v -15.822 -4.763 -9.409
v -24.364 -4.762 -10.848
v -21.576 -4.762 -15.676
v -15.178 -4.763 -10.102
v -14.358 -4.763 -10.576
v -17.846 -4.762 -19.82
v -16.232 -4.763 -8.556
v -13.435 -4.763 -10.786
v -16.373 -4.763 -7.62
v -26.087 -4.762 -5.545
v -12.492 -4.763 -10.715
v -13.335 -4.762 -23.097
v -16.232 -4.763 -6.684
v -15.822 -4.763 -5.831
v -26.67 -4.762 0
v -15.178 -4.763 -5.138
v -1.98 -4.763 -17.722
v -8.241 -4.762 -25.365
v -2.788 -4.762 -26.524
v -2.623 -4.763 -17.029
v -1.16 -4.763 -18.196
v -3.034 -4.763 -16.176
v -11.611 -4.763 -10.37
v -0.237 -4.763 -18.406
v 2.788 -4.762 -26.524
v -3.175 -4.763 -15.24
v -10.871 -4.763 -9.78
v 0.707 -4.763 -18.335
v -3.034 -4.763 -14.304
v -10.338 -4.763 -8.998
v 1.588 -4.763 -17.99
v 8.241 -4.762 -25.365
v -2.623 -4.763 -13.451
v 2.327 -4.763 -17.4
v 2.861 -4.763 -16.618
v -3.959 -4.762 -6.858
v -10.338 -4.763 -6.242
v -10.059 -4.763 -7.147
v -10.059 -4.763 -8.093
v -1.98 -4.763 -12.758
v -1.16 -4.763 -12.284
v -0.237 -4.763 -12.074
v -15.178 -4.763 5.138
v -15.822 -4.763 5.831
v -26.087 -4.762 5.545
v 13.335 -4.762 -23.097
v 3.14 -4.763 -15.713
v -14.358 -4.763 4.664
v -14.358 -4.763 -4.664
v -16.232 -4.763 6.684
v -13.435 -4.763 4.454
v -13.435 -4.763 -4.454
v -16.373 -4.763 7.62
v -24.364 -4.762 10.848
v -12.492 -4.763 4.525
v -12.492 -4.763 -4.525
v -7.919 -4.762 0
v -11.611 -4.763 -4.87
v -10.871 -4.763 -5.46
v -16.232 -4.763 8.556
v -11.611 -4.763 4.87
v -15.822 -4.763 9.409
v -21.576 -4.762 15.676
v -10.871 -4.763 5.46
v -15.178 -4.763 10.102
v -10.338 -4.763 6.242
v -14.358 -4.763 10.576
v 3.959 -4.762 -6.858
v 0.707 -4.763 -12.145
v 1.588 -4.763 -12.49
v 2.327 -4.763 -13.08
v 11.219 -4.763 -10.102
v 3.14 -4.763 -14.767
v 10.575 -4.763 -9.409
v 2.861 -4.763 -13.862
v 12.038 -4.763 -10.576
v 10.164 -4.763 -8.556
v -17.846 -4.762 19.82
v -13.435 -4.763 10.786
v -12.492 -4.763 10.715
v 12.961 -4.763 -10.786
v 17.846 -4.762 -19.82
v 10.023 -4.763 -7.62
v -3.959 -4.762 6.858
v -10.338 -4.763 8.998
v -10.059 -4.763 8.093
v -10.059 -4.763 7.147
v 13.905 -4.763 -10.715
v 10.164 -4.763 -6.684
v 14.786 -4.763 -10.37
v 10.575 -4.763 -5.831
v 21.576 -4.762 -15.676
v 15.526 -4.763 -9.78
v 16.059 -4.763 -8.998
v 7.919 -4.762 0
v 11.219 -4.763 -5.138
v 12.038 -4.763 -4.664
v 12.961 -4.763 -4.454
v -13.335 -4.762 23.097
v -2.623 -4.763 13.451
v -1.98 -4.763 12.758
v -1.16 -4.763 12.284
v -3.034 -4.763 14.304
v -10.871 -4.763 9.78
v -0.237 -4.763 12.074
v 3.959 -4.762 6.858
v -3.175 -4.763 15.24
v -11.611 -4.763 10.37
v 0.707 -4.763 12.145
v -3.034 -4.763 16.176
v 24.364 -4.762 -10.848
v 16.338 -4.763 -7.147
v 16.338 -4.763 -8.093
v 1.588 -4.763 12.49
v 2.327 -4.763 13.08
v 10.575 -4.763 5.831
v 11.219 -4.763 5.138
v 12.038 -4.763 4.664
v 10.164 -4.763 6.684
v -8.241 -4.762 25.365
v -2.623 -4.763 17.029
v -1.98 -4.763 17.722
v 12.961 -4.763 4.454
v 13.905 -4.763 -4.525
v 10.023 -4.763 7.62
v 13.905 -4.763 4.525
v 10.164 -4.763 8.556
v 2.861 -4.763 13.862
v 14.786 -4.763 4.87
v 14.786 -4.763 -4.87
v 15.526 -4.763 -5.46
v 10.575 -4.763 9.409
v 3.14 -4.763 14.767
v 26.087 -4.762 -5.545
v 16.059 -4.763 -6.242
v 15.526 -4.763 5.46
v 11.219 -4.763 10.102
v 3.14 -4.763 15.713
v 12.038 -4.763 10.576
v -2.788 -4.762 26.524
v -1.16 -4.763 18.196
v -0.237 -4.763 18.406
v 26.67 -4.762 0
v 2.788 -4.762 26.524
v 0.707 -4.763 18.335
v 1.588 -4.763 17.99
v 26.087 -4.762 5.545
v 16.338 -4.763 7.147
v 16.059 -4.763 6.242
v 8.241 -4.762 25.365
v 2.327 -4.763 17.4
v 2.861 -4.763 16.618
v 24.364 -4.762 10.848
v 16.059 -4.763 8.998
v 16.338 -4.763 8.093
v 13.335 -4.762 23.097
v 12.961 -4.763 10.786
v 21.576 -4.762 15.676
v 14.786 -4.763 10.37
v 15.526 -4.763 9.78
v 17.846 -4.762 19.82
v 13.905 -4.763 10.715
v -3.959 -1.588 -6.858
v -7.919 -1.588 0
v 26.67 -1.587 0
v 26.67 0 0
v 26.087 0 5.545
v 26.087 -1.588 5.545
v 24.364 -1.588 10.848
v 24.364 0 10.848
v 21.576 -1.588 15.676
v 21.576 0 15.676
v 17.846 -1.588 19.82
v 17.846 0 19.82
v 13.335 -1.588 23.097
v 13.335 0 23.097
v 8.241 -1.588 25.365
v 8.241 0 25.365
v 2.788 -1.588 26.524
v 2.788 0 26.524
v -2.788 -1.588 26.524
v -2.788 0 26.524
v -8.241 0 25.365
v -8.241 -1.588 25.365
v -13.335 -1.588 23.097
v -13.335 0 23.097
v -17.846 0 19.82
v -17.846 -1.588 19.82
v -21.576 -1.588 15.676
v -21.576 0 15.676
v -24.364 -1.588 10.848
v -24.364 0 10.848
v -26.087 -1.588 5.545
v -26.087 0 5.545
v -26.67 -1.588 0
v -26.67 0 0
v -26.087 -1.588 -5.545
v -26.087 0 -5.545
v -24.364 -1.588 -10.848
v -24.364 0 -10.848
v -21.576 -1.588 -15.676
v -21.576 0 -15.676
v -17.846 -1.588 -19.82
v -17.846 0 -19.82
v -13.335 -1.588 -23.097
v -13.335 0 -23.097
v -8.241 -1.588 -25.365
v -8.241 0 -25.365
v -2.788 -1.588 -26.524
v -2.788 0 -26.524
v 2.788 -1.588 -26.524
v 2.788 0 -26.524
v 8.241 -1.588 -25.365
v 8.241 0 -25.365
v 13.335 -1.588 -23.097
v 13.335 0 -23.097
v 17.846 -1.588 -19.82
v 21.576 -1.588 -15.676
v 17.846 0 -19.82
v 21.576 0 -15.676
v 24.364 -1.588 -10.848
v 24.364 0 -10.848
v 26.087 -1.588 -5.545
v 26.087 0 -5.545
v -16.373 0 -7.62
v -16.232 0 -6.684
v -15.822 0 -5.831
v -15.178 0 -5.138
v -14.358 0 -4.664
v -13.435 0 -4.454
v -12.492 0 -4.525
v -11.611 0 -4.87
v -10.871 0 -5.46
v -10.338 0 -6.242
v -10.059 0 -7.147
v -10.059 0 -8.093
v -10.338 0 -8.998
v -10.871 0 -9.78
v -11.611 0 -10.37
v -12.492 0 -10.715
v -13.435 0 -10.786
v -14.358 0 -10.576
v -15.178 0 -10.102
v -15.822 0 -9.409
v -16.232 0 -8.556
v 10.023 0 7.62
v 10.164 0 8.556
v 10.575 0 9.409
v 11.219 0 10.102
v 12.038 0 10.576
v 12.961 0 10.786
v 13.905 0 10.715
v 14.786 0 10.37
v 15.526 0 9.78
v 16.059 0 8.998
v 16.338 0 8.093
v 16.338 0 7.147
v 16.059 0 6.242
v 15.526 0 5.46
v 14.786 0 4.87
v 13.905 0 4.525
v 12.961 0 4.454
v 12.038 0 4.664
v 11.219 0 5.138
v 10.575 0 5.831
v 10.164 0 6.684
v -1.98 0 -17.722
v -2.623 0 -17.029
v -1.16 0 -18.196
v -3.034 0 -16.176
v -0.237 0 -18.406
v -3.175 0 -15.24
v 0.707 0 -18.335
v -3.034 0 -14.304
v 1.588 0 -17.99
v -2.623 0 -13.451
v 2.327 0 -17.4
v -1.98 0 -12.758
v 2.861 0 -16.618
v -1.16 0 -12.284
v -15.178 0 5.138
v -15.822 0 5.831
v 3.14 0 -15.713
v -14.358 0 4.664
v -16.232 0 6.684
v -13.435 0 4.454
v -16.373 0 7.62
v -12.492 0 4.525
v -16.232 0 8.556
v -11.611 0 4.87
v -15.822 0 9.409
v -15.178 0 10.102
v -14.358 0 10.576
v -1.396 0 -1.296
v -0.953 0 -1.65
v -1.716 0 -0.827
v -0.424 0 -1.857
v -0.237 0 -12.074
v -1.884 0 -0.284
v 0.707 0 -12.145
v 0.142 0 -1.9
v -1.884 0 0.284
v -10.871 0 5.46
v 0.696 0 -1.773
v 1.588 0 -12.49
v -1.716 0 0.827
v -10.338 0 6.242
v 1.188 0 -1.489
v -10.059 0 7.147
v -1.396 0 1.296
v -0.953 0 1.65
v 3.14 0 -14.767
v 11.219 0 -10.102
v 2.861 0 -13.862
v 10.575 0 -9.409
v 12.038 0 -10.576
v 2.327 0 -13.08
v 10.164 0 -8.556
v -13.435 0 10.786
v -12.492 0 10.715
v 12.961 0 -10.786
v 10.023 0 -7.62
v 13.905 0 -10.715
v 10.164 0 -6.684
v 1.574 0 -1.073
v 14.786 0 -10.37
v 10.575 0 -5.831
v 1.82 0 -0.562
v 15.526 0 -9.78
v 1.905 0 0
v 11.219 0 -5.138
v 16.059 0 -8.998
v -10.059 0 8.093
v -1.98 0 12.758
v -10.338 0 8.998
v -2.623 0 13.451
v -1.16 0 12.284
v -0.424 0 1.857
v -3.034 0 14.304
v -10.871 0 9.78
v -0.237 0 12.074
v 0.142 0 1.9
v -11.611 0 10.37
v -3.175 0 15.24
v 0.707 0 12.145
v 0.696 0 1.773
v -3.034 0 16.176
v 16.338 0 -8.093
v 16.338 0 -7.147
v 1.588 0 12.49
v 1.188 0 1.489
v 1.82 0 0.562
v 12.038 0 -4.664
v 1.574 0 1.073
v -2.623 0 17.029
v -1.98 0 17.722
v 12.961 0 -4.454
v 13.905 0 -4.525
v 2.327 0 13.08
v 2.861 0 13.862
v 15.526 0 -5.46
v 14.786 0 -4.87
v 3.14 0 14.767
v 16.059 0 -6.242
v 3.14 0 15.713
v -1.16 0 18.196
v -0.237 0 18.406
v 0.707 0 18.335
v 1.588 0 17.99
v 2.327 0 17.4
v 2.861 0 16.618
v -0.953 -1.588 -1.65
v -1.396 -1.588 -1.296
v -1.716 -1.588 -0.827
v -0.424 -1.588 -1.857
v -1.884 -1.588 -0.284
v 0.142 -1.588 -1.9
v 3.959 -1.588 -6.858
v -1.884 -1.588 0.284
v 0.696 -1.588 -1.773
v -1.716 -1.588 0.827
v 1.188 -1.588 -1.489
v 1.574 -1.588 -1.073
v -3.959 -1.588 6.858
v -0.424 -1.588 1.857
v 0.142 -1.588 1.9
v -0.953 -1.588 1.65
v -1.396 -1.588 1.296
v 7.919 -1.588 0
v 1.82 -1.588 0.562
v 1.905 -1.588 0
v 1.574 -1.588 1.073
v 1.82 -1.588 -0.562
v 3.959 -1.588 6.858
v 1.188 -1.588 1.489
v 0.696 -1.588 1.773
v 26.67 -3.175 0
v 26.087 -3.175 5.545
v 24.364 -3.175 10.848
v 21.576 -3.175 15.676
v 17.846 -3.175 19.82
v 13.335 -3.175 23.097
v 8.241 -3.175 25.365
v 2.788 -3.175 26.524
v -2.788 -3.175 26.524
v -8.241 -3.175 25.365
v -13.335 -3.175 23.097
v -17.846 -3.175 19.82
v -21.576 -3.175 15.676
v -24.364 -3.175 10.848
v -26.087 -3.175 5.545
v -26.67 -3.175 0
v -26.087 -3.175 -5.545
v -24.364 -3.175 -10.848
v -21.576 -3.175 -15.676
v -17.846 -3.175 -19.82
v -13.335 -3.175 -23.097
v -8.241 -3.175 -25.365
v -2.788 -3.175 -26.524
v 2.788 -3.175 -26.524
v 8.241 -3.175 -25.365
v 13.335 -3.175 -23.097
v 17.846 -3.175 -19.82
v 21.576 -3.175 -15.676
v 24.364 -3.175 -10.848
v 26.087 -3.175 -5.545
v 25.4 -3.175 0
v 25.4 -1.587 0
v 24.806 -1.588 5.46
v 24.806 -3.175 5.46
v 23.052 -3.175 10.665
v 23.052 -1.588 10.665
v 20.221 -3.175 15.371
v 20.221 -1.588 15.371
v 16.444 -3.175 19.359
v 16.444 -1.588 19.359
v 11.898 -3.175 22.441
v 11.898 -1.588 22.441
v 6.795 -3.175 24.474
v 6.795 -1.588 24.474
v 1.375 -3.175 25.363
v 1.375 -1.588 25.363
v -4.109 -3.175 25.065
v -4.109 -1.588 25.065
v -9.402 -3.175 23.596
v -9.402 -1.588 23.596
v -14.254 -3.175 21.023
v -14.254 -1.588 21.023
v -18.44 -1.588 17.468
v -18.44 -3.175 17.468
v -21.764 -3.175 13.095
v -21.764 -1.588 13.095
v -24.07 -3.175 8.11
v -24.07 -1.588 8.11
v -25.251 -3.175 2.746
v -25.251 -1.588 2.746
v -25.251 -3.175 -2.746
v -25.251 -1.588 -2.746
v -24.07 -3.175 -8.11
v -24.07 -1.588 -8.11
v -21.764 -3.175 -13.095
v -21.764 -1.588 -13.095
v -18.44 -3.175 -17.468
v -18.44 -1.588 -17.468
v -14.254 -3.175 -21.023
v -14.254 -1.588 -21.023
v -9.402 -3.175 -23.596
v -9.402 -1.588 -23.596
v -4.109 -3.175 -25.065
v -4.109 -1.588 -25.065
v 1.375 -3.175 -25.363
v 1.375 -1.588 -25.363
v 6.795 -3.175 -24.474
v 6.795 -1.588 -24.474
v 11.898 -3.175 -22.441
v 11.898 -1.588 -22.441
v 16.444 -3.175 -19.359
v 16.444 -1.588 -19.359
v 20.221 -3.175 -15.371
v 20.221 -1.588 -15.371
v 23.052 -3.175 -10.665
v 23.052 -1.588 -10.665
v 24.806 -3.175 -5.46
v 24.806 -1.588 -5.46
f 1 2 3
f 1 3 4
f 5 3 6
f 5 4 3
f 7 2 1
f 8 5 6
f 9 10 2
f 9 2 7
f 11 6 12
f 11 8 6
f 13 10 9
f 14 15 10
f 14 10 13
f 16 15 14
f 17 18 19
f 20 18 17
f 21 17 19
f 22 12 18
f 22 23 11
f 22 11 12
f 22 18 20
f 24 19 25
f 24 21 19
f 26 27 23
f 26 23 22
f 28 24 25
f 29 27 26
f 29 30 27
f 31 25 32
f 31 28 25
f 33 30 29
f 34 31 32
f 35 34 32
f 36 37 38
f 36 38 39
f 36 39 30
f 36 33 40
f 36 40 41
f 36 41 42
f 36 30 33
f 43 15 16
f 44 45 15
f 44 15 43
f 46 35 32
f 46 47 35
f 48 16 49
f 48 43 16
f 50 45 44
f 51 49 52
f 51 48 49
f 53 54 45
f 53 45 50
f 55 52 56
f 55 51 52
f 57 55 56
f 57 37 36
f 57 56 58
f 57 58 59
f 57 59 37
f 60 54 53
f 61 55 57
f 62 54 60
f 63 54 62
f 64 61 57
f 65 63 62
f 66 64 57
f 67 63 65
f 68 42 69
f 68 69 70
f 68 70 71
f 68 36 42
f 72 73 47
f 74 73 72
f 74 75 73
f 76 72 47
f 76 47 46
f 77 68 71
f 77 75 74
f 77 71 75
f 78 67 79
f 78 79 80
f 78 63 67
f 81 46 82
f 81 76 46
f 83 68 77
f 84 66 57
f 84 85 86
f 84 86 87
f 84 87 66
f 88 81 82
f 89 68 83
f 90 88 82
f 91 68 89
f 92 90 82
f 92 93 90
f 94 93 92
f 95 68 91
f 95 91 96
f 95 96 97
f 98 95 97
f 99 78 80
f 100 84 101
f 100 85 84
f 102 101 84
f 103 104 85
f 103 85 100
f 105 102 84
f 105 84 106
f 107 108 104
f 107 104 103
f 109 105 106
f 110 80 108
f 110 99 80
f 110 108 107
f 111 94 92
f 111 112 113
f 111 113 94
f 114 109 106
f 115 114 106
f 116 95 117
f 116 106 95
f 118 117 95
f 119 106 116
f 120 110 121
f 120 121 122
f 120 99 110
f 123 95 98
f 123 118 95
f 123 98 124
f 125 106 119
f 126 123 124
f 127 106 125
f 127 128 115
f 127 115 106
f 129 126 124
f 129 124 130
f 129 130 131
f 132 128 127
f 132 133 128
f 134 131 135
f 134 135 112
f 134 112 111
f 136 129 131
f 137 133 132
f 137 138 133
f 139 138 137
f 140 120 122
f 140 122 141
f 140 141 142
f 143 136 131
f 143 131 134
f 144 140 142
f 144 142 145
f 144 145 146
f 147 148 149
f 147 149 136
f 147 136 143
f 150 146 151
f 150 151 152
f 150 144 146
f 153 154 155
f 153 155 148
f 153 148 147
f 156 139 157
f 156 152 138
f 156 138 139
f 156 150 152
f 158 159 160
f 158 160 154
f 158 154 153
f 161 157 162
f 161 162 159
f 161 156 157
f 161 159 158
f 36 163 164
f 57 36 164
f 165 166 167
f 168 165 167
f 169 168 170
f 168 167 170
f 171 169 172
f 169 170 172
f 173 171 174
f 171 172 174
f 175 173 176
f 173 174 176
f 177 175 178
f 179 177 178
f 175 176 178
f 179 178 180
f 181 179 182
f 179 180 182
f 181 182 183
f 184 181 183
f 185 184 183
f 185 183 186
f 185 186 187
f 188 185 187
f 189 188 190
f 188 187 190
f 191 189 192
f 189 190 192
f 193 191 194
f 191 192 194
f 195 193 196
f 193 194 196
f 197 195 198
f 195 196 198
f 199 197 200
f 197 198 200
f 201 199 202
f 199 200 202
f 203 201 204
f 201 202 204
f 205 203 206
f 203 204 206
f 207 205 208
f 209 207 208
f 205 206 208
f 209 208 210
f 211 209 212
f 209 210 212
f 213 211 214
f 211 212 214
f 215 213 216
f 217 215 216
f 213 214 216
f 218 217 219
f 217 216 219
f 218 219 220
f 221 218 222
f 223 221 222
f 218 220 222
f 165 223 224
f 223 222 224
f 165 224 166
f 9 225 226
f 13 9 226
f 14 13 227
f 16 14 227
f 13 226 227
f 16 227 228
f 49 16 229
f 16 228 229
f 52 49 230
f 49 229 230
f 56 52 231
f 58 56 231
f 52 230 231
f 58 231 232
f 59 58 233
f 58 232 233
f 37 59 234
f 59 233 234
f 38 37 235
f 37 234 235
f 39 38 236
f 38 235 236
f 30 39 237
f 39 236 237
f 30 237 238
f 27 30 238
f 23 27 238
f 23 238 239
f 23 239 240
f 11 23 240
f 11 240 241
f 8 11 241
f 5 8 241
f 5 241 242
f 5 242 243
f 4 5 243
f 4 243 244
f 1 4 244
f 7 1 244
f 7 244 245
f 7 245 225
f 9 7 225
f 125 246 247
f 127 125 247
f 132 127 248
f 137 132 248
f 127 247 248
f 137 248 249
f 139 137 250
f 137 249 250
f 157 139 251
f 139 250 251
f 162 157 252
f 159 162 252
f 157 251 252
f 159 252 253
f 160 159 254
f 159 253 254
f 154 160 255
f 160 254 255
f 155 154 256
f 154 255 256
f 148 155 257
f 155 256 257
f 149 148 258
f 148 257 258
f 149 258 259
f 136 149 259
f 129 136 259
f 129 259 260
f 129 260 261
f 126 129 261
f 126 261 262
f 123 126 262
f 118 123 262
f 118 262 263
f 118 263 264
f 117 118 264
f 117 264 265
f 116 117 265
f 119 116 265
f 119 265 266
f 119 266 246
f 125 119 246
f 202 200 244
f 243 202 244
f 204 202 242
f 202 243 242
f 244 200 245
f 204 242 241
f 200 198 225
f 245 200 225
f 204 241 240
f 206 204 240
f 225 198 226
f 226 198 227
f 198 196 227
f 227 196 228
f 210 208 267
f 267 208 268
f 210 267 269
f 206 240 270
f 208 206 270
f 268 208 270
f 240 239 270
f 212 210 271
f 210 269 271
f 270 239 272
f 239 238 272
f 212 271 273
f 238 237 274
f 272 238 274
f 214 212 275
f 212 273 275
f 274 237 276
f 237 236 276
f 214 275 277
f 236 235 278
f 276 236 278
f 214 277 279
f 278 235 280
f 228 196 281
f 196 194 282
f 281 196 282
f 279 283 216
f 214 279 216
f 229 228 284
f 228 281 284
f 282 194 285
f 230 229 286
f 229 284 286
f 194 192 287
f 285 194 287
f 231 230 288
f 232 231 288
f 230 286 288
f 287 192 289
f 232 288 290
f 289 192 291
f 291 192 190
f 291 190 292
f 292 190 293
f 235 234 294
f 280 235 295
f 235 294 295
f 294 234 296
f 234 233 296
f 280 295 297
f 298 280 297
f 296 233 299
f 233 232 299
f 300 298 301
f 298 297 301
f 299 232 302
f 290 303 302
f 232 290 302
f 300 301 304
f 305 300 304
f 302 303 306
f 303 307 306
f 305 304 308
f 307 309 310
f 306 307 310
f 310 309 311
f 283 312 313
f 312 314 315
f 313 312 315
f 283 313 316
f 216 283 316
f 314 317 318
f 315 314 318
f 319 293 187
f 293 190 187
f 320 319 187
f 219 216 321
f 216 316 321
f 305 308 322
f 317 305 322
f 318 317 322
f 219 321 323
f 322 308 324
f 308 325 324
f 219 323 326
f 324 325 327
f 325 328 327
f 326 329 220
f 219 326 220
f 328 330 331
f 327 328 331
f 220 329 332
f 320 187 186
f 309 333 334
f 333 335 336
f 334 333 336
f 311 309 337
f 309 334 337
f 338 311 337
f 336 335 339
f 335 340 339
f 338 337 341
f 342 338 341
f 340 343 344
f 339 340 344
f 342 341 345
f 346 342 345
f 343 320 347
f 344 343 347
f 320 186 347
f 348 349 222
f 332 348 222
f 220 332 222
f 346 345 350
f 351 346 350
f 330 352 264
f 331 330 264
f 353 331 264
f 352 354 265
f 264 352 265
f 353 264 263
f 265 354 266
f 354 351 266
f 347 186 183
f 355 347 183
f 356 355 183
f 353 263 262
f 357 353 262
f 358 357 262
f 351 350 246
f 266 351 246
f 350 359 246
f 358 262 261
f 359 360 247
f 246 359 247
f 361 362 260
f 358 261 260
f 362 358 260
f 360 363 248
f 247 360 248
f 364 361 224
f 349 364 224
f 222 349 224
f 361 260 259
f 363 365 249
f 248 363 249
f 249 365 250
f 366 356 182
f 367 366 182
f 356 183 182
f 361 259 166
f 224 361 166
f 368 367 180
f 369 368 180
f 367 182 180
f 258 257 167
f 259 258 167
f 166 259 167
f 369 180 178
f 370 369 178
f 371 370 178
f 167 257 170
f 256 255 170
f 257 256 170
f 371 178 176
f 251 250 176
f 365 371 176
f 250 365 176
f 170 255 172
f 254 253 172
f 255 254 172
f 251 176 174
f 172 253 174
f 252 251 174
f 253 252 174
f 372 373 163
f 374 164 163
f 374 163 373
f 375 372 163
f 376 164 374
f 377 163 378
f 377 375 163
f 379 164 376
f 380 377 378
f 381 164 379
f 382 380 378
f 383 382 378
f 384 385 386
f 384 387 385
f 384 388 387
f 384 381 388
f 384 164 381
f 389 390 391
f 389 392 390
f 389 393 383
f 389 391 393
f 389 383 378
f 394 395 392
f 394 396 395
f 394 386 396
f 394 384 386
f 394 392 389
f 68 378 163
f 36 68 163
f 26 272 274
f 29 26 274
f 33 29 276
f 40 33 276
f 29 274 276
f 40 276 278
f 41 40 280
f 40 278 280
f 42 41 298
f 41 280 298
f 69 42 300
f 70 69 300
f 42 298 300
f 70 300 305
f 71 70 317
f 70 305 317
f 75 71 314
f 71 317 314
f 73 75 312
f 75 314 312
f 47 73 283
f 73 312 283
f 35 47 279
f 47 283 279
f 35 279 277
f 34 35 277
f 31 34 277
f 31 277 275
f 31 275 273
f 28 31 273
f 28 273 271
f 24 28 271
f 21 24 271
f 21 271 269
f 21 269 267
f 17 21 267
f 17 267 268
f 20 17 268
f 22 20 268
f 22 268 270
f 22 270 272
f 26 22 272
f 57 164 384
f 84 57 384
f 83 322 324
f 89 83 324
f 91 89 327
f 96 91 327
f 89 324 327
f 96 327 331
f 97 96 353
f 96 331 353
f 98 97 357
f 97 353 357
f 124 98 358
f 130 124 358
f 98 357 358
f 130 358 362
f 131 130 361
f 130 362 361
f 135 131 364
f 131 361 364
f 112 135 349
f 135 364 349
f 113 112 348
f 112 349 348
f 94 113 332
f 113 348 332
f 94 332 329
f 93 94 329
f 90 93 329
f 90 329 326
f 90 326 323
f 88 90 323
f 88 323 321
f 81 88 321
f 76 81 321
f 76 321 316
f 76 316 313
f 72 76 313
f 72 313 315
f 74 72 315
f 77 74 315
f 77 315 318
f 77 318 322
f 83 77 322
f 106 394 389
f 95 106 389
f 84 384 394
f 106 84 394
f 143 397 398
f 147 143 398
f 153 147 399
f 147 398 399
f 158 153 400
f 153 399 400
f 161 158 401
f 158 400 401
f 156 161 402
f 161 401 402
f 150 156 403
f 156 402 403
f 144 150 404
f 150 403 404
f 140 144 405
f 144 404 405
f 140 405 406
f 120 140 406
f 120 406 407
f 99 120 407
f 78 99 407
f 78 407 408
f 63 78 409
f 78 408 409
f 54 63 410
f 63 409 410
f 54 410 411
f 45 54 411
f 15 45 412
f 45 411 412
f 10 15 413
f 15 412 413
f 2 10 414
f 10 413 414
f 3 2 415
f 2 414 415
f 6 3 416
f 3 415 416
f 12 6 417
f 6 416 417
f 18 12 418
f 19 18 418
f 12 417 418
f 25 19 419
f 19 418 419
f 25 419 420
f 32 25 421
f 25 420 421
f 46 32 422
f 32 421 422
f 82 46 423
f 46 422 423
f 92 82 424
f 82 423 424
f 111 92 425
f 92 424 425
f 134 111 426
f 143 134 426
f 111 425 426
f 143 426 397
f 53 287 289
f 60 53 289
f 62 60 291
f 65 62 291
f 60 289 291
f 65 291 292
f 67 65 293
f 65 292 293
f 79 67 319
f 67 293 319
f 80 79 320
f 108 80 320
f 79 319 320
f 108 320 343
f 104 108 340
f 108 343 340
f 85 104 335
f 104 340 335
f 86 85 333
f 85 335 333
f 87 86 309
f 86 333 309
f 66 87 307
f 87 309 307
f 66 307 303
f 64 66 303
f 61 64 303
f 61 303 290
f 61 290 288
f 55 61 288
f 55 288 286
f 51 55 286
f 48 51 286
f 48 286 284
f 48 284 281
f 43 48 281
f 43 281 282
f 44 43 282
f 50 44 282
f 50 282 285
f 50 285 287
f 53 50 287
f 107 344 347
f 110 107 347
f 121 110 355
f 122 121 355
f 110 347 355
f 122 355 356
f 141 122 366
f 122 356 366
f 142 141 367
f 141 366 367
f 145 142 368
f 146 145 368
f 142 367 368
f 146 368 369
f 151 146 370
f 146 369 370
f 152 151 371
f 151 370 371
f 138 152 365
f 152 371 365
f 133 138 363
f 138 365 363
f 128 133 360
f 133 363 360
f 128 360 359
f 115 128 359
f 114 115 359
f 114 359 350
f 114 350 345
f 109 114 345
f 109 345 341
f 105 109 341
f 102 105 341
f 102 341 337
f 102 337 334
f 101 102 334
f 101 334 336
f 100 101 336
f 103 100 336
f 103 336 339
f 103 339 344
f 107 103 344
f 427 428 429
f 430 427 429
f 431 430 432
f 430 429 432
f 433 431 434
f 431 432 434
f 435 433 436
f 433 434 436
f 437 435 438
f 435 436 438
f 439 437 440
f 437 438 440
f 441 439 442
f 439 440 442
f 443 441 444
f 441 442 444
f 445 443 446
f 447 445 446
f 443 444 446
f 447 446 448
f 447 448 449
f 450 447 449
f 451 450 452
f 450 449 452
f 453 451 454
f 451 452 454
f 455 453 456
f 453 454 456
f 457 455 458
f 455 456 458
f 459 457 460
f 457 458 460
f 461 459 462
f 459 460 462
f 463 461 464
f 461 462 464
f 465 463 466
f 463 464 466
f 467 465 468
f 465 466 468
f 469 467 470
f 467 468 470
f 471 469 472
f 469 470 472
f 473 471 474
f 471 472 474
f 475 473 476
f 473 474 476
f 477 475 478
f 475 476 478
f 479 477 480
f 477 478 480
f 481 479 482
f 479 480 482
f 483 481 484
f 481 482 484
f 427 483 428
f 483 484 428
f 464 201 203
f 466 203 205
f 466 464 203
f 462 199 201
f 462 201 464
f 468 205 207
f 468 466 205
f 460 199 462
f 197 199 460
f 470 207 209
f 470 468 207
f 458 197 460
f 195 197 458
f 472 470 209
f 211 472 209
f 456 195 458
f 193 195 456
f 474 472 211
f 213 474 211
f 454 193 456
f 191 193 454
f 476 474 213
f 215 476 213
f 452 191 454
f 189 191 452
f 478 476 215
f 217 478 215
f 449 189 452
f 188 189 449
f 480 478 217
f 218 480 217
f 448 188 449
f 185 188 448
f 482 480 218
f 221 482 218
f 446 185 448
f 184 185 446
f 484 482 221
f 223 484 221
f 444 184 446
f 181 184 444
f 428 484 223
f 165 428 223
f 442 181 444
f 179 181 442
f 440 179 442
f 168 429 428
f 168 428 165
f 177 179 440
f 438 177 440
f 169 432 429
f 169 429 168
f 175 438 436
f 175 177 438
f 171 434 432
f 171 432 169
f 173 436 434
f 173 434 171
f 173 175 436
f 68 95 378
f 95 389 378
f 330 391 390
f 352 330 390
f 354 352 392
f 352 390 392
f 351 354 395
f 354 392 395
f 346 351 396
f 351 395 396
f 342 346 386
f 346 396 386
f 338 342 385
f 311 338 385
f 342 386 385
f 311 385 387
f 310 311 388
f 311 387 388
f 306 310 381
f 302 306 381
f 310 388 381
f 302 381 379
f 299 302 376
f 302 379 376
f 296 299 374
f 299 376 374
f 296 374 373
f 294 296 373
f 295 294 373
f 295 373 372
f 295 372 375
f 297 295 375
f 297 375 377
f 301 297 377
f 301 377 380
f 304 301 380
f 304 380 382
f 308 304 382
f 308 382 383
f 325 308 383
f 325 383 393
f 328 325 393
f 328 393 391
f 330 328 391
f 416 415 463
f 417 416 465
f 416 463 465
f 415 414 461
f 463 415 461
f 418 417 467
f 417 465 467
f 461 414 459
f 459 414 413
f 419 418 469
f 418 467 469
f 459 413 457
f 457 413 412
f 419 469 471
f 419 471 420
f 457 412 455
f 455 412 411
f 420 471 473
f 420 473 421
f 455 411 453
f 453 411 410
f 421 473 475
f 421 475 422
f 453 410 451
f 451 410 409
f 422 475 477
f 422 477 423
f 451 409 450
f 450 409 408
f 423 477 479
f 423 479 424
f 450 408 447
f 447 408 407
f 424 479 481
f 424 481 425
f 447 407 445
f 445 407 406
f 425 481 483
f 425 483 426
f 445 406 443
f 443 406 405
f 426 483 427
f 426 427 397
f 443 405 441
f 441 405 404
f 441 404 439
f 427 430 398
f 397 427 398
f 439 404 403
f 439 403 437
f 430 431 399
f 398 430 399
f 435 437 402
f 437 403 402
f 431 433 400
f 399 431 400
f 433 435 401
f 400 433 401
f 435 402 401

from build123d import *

# Parameters (mm, degrees)
F0_R     = 26.67
F0_R_2   = 25.4
F1_DEPTH = 1.5875
F2_R     = 25.4
F3_DEPTH = 1.5875
F4_R     = 26.67
F4_R_2   = 25.4
F5_DEPTH = 1.5875
F6_R     = 1.905
F7_DEPTH = 25.4
F9_D     = 6.35


# Not quite as in the source:
# - a length typed as a fraction of an inch, garbled in the dataset ("3 / 203.2 mm" for 3/8 in), is restored


with BuildPart() as f1:
    # F0 (on Front) → F1 (new body)
    with BuildSketch(Plane.XZ):
        Circle(F0_R)
        Circle(F0_R_2, mode=Mode.SUBTRACT)
        Circle(F0_R_2)
        with BuildLine():
            ThreePointArc((3.9594681461, 6.858), (6.858, 3.9594681461), (7.9189362922, 0))
            ThreePointArc((7.9189362922, 0), (6.858, -3.9594681461), (3.9594681461, -6.858))
            ThreePointArc((3.9594681461, -6.858), (0, -7.9189362922), (-3.9594681461, -6.858))
            ThreePointArc((-3.9594681461, -6.858), (-6.858, -3.9594681461), (-7.9189362922, 0))
            ThreePointArc((-7.9189362922, 0), (-6.858, 3.9594681461), (-3.9594681461, 6.858))
            ThreePointArc((-3.9594681461, 6.858), (0, 7.9189362922), (3.9594681461, 6.858))
        make_face(mode=Mode.SUBTRACT)
        Polygon((3.9594681461, -6.858), (7.9189362922, 0), (3.9594681461, 6.858), (-3.9594681461, 6.858), (-7.9189362922, 0), (-3.9594681461, -6.858), align=None)
        with BuildLine():
            Line((-3.9594681461, 6.858), (3.9594681461, 6.858))
            ThreePointArc((3.9594681461, 6.858), (0, 7.9189362922), (-3.9594681461, 6.858))
        make_face()
        with BuildLine():
            Line((3.9594681461, 6.858), (7.9189362922, 0))
            ThreePointArc((7.9189362922, 0), (6.858, 3.9594681461), (3.9594681461, 6.858))
        make_face()
        with BuildLine():
            ThreePointArc((3.9594681461, -6.858), (6.858, -3.9594681461), (7.9189362922, 0))
            Line((7.9189362922, 0), (3.9594681461, -6.858))
        make_face()
        with BuildLine():
            ThreePointArc((-3.9594681461, -6.858), (0, -7.9189362922), (3.9594681461, -6.858))
            Line((3.9594681461, -6.858), (-3.9594681461, -6.858))
        make_face()
        with BuildLine():
            ThreePointArc((-7.9189362922, 0), (-6.858, -3.9594681461), (-3.9594681461, -6.858))
            Line((-3.9594681461, -6.858), (-7.9189362922, 0))
        make_face()
        with BuildLine():
            Line((-7.9189362922, 0), (-3.9594681461, 6.858))
            ThreePointArc((-3.9594681461, 6.858), (-6.858, 3.9594681461), (-7.9189362922, 0))
        make_face()
    extrude(amount=F1_DEPTH)

    # F2 (on face) → F3 (join)
    with BuildSketch(Plane.XZ.offset(1.5875)):
        Circle(F2_R)
        with BuildLine():
            ThreePointArc((3.9594681461, 6.858), (6.858, 3.9594681461), (7.9189362922, 0))
            ThreePointArc((7.9189362922, 0), (6.858, -3.9594681461), (3.9594681461, -6.858))
            ThreePointArc((3.9594681461, -6.858), (0, -7.9189362922), (-3.9594681461, -6.858))
            ThreePointArc((-3.9594681461, -6.858), (-6.858, -3.9594681461), (-7.9189362922, 0))
            ThreePointArc((-7.9189362922, 0), (-6.858, 3.9594681461), (-3.9594681461, 6.858))
            ThreePointArc((-3.9594681461, 6.858), (0, 7.9189362922), (3.9594681461, 6.858))
        make_face(mode=Mode.SUBTRACT)
        with BuildLine():
            Line((3.9594681461, 6.858), (7.9189362922, 0))
            ThreePointArc((7.9189362922, 0), (6.858, 3.9594681461), (3.9594681461, 6.858))
        make_face()
        with BuildLine():
            Line((-3.9594681461, 6.858), (3.9594681461, 6.858))
            ThreePointArc((3.9594681461, 6.858), (0, 7.9189362922), (-3.9594681461, 6.858))
        make_face()
        with BuildLine():
            Line((-7.9189362922, 0), (-3.9594681461, 6.858))
            ThreePointArc((-3.9594681461, 6.858), (-6.858, 3.9594681461), (-7.9189362922, 0))
        make_face()
        with BuildLine():
            ThreePointArc((-7.9189362922, 0), (-6.858, -3.9594681461), (-3.9594681461, -6.858))
            Line((-3.9594681461, -6.858), (-7.9189362922, 0))
        make_face()
        with BuildLine():
            ThreePointArc((-3.9594681461, -6.858), (0, -7.9189362922), (3.9594681461, -6.858))
            Line((3.9594681461, -6.858), (-3.9594681461, -6.858))
        make_face()
        with BuildLine():
            ThreePointArc((3.9594681461, -6.858), (6.858, -3.9594681461), (7.9189362922, 0))
            Line((7.9189362922, 0), (3.9594681461, -6.858))
        make_face()
    extrude(amount=F3_DEPTH)

    # F4 (on face) + F0 (on Front) → F5 (join)
    with BuildSketch(Plane.XZ.offset(3.175)):
        Circle(F4_R)
        Circle(F4_R_2, mode=Mode.SUBTRACT)
        Circle(F4_R_2)
        Polygon((7.9189362922, 0), (3.9594681461, -6.858), (-3.9594681461, -6.858), (-7.9189362922, 0), (-3.9594681461, 6.858), (3.9594681461, 6.858), align=None, mode=Mode.SUBTRACT)
    with BuildSketch(Plane.XZ):
        Circle(F0_R)
        Circle(F0_R_2, mode=Mode.SUBTRACT)
    extrude(amount=F5_DEPTH)

    # F6 (on face) → F7 (cut)
    with BuildSketch(Plane.XZ.offset(1.5875)):
        Circle(F6_R)
    extrude(amount=-F7_DEPTH, mode=Mode.SUBTRACT)

    # F9 (through all)
    with Locations(Plane.XZ.offset(4.7625)):
        with Locations((0, 15.24), (0, -15.24), (-13.1982271537, -7.62), (-13.1982271537, 7.62), (13.1982271537, 7.62), (13.1982271537, -7.62)):
            Hole(F9_D / 2)


solid = f1.part
